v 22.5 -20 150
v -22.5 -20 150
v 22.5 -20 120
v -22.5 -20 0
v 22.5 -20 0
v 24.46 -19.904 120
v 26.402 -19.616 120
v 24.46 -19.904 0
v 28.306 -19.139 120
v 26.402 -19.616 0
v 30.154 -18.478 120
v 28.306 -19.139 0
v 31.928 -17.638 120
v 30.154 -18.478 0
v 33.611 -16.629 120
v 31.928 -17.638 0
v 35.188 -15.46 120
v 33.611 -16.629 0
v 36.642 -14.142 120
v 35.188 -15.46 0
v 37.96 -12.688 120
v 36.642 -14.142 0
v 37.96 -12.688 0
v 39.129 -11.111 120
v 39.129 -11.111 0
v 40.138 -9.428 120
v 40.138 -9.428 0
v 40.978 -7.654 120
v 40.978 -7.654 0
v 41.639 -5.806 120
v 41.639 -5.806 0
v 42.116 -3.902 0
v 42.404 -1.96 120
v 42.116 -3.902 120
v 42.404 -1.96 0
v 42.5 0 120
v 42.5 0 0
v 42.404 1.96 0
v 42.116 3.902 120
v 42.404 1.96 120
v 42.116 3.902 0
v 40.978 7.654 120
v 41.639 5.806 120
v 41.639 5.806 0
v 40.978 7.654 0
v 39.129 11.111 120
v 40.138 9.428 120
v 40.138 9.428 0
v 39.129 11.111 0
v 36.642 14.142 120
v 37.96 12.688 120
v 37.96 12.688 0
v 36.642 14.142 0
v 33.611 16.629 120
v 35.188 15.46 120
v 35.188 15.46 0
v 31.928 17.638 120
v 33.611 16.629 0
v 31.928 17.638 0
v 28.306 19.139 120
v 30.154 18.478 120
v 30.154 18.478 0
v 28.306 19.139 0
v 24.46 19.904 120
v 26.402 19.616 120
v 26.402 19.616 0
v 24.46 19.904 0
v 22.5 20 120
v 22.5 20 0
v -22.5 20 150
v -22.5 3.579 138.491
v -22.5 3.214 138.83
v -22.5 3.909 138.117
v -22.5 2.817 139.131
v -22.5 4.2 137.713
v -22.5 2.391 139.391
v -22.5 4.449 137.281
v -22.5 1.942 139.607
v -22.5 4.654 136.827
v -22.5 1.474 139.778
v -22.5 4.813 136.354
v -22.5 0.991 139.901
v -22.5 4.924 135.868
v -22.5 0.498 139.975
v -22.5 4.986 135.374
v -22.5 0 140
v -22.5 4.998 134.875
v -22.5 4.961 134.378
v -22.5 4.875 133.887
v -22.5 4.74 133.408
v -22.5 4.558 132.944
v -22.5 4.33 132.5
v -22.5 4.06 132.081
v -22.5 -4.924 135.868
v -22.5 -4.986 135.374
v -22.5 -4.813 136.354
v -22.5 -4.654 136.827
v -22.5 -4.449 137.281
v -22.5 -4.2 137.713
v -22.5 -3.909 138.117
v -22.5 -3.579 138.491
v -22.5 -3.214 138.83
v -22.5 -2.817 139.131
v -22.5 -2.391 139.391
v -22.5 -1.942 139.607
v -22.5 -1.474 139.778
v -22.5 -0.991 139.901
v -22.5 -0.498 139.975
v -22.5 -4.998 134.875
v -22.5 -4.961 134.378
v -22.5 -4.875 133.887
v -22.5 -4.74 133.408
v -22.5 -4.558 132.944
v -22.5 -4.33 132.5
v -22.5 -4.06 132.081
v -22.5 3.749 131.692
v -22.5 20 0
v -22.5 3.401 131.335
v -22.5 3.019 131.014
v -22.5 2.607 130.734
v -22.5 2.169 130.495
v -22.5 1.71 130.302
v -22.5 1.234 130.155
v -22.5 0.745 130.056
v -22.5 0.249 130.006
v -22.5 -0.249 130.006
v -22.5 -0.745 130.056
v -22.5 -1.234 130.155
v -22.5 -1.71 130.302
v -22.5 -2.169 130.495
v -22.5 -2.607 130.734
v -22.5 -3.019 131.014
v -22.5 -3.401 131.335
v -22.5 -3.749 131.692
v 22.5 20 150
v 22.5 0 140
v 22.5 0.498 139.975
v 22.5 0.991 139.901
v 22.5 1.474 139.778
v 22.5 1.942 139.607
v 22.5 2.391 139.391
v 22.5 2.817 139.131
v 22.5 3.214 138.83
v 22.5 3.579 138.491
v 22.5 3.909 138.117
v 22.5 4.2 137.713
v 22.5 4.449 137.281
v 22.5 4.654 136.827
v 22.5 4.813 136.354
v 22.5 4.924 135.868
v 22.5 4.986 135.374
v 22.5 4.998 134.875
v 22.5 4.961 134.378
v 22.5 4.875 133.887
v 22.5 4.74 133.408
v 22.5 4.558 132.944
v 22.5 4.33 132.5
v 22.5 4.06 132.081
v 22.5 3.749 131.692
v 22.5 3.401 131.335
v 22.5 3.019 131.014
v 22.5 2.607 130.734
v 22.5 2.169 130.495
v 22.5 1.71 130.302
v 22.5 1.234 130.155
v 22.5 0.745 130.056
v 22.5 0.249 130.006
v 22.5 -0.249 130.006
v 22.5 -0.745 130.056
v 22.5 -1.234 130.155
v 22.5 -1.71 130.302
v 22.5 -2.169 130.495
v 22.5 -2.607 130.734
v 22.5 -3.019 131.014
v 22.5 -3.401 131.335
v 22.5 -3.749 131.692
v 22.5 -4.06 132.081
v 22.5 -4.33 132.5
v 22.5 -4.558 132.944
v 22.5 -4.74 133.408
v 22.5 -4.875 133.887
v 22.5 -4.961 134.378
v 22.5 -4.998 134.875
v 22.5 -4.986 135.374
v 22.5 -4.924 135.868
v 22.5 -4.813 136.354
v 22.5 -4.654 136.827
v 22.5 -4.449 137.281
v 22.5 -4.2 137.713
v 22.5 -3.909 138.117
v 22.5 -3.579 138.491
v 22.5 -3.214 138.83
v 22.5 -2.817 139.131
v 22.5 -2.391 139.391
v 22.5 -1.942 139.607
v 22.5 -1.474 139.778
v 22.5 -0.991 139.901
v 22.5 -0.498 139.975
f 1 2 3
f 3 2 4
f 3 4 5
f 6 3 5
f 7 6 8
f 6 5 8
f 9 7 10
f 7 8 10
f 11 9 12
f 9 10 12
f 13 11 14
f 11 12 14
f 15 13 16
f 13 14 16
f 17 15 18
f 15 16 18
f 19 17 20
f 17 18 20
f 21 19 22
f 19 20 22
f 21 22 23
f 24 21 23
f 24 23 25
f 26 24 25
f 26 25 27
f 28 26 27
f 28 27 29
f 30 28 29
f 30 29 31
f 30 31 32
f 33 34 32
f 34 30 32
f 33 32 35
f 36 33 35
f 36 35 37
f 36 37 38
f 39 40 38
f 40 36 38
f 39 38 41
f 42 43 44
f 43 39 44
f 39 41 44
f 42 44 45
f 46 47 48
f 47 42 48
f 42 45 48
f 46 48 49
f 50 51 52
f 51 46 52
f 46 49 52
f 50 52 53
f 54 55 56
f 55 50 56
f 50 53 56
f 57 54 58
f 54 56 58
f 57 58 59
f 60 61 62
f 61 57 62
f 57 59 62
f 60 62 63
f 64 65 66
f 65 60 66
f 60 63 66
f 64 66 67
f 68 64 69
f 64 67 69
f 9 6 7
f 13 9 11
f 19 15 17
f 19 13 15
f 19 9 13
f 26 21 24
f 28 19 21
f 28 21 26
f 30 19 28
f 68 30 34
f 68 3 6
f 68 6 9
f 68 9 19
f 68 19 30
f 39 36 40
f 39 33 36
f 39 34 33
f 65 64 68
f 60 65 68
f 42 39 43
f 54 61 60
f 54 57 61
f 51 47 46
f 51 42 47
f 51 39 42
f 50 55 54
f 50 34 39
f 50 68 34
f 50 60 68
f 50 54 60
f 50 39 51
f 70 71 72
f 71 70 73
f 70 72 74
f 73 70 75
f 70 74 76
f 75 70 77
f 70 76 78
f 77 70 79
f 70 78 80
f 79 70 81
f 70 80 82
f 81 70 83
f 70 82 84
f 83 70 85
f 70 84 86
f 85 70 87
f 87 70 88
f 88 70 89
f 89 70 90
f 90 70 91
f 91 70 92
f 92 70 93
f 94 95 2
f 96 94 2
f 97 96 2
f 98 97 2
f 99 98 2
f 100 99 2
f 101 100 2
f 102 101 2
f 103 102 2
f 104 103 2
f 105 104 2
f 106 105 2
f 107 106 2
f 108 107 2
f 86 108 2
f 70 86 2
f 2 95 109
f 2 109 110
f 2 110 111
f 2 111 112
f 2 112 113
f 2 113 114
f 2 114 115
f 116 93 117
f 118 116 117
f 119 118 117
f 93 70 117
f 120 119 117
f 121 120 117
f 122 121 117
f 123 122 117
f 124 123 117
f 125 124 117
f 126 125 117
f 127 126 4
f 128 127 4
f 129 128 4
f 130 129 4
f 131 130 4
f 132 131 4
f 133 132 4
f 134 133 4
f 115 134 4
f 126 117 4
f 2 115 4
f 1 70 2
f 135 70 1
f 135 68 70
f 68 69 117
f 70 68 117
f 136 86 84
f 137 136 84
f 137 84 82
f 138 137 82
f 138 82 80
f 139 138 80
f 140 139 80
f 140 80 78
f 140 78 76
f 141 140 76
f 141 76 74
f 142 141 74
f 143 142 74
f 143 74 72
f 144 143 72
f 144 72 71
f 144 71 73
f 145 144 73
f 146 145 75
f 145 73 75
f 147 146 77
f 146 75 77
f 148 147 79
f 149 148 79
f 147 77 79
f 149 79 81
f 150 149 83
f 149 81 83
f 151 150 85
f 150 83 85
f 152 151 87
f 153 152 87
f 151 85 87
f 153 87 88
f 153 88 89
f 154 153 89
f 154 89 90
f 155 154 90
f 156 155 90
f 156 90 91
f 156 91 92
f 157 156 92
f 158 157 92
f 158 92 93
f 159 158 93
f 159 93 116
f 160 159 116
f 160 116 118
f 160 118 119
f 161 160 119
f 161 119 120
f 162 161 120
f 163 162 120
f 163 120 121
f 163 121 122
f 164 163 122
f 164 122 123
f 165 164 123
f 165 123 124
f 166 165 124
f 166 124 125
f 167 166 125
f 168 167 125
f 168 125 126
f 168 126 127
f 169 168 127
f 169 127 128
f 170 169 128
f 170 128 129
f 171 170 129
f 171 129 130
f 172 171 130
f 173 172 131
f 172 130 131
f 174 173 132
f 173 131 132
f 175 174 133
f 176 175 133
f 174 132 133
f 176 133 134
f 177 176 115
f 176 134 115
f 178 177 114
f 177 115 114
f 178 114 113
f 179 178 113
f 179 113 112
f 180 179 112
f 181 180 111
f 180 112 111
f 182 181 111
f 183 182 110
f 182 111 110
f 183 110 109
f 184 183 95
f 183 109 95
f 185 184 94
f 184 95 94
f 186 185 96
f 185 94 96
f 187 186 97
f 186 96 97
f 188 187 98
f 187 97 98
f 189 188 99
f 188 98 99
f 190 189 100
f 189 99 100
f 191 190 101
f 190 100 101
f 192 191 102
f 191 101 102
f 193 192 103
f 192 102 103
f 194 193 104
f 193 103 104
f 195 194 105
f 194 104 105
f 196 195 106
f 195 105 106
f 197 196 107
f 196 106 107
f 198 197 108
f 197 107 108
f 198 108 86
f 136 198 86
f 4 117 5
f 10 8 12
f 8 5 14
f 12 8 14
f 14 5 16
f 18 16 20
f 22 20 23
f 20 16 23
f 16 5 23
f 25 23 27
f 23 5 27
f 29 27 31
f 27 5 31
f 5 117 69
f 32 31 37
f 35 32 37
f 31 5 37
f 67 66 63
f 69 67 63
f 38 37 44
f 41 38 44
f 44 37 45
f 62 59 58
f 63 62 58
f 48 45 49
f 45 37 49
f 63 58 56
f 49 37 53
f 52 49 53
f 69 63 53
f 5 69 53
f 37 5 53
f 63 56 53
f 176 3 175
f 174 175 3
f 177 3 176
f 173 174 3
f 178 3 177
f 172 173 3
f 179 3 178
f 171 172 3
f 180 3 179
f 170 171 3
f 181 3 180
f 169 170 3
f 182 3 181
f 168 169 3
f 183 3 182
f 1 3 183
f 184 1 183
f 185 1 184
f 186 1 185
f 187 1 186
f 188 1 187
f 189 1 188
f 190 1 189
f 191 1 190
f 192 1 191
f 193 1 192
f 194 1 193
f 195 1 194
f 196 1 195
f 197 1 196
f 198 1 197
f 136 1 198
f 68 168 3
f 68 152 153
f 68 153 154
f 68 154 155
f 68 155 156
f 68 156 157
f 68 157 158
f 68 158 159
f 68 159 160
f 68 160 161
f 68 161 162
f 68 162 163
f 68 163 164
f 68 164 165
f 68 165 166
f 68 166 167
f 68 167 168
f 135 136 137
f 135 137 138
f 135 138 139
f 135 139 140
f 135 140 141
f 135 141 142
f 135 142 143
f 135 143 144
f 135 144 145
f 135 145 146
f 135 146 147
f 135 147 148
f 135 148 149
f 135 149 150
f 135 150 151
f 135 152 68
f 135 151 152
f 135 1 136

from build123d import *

# Parameters (mm, degrees)
SALIENTE_EXTRUIR1_DEPTH = 150
CROQUIS4_W              = 20
CROQUIS4_H              = 40
CORTAR_EXTRUIR1_DEPTH   = 30
CROQUIS5_R              = 5
CORTAR_EXTRUIR2_DEPTH   = 52


with BuildPart() as part:
    # Croquis1 → Saliente-Extruir1 (new body)
    with BuildSketch(Plane.XY):
        with BuildLine():
            Line((-22.5, -20), (22.5, -20))
            ThreePointArc((22.5, -20), (42.5, 0), (22.5, 20))
            Line((22.5, 20), (-22.5, 20))
            Line((-22.5, 20), (-22.5, -20))
        make_face()
    extrude(amount=SALIENTE_EXTRUIR1_DEPTH)

    # Croquis4 → Cortar-Extruir1 (cut)
    with BuildSketch(Plane.XY.offset(150)):
        with Locations((32.5, 0)):
            Rectangle(CROQUIS4_W, CROQUIS4_H)
    extrude(amount=-CORTAR_EXTRUIR1_DEPTH, mode=Mode.SUBTRACT)

    # Croquis5 → Cortar-Extruir2 (cut)
    with BuildSketch(Plane.ZY.offset(22.5)):
        with Locations((135, 0)):
            Circle(CROQUIS5_R)
    extrude(amount=-CORTAR_EXTRUIR2_DEPTH, mode=Mode.SUBTRACT)


solid = part.part
